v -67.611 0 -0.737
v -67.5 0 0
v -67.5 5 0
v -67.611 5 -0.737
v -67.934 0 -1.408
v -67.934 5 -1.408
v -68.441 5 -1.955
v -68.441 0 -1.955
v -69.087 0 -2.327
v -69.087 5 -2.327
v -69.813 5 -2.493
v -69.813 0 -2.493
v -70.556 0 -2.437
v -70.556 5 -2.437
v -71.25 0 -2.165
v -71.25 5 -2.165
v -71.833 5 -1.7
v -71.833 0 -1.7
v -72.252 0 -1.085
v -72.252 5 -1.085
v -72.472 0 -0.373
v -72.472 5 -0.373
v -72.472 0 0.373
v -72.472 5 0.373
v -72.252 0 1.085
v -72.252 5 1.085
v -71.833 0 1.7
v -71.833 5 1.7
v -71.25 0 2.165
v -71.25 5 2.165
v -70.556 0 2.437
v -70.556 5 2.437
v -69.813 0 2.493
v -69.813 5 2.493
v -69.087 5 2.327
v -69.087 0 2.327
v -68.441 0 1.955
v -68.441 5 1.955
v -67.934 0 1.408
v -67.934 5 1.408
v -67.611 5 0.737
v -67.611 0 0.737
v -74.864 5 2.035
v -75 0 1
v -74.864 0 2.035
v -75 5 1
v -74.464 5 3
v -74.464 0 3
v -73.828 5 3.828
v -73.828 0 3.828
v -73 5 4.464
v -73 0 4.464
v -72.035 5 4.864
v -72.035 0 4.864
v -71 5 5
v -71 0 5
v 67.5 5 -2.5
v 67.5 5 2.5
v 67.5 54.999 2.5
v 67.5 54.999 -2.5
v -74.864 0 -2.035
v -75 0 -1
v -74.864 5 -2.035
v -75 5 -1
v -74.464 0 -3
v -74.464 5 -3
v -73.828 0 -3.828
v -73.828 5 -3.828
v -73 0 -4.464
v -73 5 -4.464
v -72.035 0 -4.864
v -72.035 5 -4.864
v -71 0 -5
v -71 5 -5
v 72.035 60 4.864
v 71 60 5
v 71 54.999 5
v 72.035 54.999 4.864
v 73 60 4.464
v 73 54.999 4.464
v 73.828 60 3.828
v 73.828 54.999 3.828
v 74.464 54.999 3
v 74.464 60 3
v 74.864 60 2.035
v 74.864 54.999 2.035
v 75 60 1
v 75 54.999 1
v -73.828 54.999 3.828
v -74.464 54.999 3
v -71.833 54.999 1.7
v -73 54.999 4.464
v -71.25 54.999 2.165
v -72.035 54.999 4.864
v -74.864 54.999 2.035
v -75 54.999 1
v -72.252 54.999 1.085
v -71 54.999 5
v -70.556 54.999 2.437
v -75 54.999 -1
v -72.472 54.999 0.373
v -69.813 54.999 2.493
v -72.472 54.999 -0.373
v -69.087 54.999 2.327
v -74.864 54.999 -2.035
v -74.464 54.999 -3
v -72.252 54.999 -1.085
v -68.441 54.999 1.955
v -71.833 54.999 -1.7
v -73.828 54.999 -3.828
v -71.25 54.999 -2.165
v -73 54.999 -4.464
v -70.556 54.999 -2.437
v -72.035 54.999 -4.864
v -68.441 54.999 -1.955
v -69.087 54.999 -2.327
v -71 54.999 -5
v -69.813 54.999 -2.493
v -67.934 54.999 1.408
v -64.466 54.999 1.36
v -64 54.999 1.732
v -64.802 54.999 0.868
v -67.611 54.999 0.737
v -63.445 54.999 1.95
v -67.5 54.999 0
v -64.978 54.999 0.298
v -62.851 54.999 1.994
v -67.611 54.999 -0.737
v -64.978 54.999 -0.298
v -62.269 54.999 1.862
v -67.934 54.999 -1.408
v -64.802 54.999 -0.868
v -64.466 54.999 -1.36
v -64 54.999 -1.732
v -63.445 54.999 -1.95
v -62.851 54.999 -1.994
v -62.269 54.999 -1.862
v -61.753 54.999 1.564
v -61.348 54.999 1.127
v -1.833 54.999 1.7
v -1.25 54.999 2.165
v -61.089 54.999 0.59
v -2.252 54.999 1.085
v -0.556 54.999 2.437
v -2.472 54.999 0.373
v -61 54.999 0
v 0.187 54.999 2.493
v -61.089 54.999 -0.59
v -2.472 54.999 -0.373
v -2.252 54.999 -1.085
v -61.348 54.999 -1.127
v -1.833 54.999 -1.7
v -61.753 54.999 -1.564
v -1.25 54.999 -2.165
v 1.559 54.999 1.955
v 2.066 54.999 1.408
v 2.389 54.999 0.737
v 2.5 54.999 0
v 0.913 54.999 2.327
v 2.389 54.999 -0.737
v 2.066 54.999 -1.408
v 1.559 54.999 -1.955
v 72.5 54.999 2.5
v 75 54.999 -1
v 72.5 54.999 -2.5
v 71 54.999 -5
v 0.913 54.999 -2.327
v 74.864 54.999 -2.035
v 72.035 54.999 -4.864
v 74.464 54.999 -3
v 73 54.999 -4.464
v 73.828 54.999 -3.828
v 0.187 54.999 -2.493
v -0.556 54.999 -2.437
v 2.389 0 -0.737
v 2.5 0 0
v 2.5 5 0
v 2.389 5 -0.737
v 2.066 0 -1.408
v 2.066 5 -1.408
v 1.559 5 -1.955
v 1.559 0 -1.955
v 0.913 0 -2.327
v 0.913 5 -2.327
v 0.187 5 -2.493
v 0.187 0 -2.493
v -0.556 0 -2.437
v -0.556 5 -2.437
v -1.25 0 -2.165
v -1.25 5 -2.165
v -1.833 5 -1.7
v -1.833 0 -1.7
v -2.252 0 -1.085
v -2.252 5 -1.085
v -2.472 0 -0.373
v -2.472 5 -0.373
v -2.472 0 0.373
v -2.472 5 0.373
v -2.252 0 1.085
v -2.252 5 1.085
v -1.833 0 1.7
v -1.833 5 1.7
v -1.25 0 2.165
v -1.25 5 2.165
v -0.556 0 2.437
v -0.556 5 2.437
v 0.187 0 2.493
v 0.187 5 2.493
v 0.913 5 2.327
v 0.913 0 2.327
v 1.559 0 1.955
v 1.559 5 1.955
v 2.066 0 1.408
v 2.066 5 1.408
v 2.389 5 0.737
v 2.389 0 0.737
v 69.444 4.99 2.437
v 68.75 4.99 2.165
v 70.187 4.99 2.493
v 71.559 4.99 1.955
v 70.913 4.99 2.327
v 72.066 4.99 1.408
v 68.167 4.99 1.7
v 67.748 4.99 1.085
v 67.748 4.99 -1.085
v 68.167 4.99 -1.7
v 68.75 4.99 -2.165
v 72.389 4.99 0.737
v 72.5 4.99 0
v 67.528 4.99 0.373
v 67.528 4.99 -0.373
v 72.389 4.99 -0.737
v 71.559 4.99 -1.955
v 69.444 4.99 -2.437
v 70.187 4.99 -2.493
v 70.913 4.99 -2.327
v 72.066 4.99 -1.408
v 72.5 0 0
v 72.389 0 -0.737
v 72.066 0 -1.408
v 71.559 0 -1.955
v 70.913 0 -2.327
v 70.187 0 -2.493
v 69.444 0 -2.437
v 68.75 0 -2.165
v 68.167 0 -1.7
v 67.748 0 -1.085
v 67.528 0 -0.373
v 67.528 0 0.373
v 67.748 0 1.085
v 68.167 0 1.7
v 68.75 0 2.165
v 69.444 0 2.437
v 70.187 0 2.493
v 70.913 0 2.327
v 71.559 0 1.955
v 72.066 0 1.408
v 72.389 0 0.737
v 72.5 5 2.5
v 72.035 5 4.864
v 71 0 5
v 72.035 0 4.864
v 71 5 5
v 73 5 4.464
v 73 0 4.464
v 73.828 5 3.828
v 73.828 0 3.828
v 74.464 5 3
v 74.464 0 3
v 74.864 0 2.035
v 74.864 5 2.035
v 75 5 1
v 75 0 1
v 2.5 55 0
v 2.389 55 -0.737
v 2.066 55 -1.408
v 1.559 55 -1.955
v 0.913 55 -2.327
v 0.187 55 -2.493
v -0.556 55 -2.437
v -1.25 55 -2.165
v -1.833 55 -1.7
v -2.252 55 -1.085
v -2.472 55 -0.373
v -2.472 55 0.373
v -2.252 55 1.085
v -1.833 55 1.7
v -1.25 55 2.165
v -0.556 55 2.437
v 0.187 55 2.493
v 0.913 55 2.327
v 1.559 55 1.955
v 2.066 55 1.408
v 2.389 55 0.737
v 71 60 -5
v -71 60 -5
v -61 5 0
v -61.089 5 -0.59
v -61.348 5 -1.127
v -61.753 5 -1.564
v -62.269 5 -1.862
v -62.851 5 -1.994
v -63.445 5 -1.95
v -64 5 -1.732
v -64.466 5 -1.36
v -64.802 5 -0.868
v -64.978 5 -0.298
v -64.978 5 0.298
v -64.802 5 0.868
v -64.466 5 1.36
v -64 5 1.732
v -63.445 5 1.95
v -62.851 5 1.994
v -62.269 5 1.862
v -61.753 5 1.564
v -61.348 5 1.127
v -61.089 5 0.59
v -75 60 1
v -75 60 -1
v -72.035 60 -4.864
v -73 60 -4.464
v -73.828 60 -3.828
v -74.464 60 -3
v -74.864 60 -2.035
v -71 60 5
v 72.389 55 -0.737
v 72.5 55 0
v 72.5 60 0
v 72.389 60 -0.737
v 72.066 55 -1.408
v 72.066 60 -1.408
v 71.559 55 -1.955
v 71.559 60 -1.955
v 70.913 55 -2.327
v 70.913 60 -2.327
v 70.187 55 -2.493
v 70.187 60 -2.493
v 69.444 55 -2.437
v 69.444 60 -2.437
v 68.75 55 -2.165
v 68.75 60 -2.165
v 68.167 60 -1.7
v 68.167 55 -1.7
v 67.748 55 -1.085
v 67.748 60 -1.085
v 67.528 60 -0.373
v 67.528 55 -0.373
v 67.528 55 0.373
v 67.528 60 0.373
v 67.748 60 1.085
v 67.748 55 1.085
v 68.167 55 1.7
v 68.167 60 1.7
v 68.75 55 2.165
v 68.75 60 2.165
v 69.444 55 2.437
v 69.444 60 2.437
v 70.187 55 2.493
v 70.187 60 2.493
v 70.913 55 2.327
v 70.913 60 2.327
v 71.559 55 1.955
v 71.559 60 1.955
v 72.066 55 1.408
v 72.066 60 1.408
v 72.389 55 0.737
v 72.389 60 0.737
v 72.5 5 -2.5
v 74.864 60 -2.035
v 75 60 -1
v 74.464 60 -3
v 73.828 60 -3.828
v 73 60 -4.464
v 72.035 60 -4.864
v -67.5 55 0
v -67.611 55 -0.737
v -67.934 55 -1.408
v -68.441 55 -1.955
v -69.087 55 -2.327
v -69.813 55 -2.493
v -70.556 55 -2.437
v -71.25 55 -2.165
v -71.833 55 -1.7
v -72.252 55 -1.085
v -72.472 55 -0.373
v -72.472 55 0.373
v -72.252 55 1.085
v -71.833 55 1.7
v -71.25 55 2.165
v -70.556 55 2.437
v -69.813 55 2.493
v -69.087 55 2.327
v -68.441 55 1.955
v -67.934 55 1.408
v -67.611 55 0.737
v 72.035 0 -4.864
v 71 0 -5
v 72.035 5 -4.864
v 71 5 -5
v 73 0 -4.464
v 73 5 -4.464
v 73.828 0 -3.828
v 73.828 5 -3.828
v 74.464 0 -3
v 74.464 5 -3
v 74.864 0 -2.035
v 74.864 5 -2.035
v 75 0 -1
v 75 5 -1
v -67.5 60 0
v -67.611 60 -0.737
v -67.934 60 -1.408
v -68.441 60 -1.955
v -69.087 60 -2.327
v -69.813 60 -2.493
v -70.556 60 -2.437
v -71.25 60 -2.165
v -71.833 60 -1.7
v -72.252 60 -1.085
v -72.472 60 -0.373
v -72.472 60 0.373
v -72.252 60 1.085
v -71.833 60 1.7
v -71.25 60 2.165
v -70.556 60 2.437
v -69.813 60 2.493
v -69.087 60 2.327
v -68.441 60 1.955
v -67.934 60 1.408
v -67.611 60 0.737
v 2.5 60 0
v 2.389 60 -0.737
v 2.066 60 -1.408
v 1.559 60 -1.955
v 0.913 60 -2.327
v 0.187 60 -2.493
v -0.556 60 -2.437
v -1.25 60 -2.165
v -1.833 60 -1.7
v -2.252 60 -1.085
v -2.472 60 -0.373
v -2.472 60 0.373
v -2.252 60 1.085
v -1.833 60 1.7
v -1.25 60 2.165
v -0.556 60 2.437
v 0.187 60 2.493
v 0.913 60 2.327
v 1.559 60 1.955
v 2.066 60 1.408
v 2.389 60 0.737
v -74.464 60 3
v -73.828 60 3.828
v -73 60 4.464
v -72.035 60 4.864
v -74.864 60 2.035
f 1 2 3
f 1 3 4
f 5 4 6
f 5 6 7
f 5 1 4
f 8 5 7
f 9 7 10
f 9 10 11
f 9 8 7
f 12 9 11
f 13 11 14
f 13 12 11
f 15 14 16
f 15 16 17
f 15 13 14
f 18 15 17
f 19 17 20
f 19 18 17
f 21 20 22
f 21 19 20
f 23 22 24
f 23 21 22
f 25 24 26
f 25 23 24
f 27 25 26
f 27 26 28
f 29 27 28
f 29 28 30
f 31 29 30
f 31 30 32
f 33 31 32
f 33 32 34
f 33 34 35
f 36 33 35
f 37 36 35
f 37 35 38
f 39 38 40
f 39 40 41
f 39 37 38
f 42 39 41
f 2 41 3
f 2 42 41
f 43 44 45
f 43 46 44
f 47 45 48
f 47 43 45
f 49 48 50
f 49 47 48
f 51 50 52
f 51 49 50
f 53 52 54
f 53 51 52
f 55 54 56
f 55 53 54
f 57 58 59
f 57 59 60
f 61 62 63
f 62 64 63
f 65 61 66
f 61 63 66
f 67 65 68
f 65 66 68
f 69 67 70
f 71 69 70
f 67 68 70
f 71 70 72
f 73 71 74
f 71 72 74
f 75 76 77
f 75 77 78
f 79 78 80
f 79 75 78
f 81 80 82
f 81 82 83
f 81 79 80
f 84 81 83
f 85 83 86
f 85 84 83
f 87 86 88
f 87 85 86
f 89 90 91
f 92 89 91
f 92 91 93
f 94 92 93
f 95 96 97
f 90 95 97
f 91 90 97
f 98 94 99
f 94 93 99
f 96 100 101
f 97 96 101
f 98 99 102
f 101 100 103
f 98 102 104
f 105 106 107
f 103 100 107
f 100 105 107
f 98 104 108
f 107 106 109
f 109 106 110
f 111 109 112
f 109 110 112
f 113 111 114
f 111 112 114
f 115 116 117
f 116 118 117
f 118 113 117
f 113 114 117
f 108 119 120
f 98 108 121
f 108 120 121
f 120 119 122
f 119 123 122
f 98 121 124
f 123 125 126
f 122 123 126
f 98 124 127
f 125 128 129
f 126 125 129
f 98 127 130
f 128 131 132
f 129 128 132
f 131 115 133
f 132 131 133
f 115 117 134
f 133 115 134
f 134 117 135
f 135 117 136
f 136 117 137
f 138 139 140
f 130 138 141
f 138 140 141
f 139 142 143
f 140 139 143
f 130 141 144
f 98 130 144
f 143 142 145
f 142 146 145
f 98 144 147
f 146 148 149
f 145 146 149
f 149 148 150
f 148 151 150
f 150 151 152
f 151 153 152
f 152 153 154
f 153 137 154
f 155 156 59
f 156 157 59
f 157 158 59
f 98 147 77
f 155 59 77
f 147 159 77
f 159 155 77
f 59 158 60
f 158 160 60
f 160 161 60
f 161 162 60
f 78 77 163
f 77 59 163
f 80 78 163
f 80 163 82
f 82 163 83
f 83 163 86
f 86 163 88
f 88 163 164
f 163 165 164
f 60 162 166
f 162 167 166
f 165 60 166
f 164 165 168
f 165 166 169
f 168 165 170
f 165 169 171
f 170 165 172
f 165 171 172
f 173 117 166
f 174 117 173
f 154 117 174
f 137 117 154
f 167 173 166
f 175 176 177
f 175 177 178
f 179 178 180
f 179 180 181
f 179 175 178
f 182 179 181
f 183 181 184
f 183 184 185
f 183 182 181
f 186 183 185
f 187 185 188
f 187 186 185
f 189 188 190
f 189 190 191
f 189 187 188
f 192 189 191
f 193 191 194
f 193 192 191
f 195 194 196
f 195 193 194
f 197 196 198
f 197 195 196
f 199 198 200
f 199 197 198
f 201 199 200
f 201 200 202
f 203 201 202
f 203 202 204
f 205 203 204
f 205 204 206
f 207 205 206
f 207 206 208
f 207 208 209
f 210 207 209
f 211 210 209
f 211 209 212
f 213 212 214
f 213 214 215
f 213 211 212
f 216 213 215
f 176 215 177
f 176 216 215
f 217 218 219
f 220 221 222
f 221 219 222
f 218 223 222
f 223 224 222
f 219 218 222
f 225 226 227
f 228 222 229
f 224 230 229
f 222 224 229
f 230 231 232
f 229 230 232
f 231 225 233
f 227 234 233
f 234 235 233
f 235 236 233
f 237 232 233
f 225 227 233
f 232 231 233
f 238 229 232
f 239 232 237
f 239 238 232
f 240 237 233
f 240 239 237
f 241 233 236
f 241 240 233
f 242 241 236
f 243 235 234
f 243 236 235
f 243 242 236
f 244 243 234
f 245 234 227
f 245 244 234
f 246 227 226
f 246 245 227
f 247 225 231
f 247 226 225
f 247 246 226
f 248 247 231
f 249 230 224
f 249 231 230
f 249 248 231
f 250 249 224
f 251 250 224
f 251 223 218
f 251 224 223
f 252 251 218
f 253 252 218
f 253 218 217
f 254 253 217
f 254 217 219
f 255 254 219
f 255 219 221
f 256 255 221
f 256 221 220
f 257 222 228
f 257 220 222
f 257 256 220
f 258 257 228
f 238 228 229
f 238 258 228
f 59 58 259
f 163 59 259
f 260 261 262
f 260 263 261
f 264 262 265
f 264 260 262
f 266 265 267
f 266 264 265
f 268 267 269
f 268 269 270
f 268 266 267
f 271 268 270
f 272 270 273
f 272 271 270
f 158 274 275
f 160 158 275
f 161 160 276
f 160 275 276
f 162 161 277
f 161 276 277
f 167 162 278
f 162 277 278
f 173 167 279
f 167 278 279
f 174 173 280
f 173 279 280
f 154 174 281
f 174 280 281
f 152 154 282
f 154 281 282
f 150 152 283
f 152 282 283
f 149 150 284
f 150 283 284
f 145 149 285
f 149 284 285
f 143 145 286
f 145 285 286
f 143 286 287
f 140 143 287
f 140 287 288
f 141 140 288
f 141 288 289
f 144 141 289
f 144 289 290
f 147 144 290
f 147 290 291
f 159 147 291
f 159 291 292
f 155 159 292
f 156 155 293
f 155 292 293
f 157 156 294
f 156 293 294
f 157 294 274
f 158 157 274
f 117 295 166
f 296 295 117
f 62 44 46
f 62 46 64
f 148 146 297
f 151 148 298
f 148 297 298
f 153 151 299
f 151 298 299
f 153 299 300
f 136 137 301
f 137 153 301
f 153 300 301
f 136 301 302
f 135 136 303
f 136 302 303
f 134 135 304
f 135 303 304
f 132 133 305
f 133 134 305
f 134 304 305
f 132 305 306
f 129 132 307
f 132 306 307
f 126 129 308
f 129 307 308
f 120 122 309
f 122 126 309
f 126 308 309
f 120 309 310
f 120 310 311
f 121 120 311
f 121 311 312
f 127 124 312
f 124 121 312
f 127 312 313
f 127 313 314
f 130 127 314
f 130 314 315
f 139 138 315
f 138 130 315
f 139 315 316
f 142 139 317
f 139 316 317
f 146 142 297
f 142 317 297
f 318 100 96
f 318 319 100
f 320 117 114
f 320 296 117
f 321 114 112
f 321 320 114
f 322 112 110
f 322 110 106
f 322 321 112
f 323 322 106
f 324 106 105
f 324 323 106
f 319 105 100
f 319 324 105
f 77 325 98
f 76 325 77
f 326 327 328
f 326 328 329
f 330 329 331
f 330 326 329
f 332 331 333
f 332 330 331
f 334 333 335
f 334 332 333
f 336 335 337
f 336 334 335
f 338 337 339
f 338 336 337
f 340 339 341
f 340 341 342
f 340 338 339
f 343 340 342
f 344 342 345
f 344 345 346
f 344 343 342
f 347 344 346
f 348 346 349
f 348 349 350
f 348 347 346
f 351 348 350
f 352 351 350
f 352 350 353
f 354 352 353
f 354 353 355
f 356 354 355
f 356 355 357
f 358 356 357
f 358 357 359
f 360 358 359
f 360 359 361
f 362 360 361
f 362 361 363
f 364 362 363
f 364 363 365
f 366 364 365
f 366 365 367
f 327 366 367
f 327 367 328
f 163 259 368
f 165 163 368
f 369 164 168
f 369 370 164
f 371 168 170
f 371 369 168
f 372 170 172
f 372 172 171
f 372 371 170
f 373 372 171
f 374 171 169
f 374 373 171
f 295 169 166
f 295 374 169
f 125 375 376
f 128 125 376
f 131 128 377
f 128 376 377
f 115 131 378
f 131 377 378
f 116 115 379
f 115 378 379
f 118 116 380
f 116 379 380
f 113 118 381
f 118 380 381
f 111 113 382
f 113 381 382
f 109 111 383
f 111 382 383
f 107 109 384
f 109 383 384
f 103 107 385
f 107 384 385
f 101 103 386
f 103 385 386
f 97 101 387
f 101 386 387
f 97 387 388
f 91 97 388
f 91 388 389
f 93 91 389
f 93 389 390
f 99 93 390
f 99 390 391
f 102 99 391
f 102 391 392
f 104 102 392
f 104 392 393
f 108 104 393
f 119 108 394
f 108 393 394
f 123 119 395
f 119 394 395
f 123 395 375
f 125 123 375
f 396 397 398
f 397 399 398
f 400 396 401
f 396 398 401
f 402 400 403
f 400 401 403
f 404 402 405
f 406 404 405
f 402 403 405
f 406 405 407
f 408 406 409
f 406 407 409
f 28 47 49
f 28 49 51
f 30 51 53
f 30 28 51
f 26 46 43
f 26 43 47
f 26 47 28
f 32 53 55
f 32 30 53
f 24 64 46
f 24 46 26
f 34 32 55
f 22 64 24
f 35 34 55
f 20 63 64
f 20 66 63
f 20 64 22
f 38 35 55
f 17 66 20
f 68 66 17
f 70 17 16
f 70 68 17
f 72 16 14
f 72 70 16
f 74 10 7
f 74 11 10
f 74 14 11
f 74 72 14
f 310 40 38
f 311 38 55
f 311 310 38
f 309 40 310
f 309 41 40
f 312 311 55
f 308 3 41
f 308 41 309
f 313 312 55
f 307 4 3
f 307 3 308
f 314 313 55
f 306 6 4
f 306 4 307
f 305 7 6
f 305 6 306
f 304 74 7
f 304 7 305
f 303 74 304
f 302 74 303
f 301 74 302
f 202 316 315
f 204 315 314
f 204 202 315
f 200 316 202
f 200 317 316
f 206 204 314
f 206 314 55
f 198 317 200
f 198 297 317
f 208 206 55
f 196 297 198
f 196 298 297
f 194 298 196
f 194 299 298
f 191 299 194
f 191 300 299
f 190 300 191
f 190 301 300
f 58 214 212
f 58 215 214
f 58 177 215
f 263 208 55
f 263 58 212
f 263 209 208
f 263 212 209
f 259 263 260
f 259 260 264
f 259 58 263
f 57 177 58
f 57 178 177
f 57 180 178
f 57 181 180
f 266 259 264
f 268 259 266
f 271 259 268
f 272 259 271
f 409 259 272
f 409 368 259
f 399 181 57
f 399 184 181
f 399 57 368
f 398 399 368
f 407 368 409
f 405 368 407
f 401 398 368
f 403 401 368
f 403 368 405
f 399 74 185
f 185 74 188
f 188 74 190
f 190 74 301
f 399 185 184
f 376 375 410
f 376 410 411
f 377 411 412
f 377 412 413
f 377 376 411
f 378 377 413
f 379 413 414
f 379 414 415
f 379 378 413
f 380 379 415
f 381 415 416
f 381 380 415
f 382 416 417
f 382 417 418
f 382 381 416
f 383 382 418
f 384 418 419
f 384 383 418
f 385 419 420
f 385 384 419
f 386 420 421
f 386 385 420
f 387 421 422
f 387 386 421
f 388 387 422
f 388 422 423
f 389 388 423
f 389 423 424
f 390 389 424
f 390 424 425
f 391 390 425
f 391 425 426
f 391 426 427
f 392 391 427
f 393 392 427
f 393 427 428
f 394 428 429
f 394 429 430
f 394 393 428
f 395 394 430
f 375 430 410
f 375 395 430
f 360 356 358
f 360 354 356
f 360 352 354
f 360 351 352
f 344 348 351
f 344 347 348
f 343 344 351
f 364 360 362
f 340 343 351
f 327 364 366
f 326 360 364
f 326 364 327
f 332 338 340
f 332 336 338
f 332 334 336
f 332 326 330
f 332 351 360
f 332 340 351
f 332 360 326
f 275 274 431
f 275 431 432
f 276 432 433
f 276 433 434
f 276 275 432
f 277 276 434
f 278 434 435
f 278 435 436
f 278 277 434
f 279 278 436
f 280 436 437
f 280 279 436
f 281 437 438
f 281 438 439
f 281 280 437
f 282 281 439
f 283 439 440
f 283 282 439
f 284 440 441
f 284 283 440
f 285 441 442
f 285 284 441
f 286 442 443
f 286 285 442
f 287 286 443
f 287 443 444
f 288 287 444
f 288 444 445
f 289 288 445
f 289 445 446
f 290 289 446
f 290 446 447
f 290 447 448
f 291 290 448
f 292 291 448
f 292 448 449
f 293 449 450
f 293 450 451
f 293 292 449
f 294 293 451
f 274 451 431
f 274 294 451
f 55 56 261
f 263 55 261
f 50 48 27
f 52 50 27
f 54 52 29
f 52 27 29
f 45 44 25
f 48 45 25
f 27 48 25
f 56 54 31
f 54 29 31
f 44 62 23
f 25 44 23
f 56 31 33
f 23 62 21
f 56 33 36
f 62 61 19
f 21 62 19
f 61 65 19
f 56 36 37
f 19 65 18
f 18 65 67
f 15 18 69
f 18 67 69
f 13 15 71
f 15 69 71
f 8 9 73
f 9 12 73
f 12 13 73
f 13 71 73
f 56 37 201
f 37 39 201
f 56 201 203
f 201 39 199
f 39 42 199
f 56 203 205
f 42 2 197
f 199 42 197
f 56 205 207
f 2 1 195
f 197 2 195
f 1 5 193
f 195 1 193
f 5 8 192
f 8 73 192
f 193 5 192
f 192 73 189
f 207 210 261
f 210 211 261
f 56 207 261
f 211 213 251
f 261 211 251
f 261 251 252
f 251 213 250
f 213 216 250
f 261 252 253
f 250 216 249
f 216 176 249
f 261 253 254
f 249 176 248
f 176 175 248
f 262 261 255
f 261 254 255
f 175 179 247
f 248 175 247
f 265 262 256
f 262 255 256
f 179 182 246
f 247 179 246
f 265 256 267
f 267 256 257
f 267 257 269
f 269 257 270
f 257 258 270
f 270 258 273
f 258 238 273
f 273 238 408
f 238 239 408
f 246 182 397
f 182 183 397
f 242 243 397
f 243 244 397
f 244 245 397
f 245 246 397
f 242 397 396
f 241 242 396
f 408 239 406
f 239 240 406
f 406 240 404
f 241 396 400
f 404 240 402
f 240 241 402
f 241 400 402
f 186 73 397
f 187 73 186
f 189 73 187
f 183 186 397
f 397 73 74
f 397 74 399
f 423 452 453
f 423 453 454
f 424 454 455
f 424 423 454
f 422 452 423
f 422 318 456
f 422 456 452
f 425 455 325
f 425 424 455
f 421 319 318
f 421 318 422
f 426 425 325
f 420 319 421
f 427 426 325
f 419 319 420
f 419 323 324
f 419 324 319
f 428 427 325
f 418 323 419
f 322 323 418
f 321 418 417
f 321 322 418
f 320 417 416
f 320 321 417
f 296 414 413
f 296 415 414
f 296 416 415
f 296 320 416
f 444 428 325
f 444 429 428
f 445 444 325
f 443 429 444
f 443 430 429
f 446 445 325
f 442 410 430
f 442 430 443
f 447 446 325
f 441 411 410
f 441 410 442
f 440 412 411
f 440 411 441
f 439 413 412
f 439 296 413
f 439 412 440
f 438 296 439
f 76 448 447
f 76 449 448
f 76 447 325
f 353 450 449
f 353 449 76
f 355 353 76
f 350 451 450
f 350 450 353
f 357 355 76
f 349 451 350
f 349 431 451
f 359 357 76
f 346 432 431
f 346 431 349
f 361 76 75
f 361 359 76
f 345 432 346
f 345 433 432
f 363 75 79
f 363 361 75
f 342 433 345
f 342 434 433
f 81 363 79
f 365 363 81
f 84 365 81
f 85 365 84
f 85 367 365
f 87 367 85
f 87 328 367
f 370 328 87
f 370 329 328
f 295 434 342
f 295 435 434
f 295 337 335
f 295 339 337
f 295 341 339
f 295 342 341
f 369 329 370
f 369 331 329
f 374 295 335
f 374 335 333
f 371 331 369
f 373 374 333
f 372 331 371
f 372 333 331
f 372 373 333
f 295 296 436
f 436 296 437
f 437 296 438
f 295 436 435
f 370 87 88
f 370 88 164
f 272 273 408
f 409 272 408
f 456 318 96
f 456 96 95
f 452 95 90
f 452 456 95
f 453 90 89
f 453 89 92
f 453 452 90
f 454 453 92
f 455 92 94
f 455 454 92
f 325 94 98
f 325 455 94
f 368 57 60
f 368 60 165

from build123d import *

# Parameters (mm, degrees)
CROQUIS1_W                    = 150
CROQUIS1_H                    = 10
CROQUIS1_R                    = 2.5
SALIENTE_EXTRUIR1_DEPTH       = 5
REDONDEO1_R                   = 4
CROQUIS2_R                    = 2
CROQUIS2_W                    = 5
CROQUIS2_H                    = 5
SALIENTE_EXTRUIR2_DEPTH       = 50
SALIENTE_EXTRUIR2_DEPTH_BACK  = 0.01
CROQUIS3_R                    = 2.5
SALIENTE_EXTRUIR10_DEPTH      = 5
SALIENTE_EXTRUIR10_DEPTH_BACK = 0.001


with BuildPart() as part:
    # Croquis1 → Saliente-Extruir1 (new body)
    with BuildSketch(Plane(origin=(0, 0, 0), x_dir=(1, 0, 0), z_dir=(0, 1, 0))):
        Rectangle(CROQUIS1_W, CROQUIS1_H)
        with Locations((-70, 0)):
            Circle(CROQUIS1_R, mode=Mode.SUBTRACT)
        with Locations((70, 0)):
            Circle(CROQUIS1_R, mode=Mode.SUBTRACT)
        Circle(CROQUIS1_R, mode=Mode.SUBTRACT)
    extrude(amount=SALIENTE_EXTRUIR1_DEPTH)

    # Redondeo1
    redondeo1_edges = [part.edges().sort_by_distance(p)[0] for p in [
        (75, 2.5, 5),
        (-75, 2.5, 5),
        (-75, 2.5, -5),
        (75, 2.5, -5),
    ]]
    fillet(redondeo1_edges, radius=REDONDEO1_R)

    # Croquis2 → Saliente-Extruir2 (add, two sides)
    with BuildSketch(Plane(origin=(0, 5, 0), x_dir=(1, 0, 0), z_dir=(0, 1, 0))) as saliente_extruir2_sk:
        with Locations((-63, 0)):
            Circle(CROQUIS2_R)
        with Locations((70, 0)):
            Rectangle(CROQUIS2_W, CROQUIS2_H)
    extrude(amount=SALIENTE_EXTRUIR2_DEPTH)
    extrude(saliente_extruir2_sk.sketch, amount=-SALIENTE_EXTRUIR2_DEPTH_BACK)

    # Croquis3 → Saliente-Extruir10 (add, two sides)
    with BuildSketch(Plane(origin=(0, 55, 0), x_dir=(1, 0, 0), z_dir=(0, 1, 0))) as saliente_extruir10_sk:
        with BuildLine():
            Line((-75, 1), (-75, -1))
            ThreePointArc((-75, -1), (-73.828427125, -3.828427125), (-71, -5))
            Line((-71, -5), (71, -5))
            ThreePointArc((71, -5), (73.828427125, -3.828427125), (75, -1))
            Line((75, -1), (75, 1))
            ThreePointArc((75, 1), (73.828427125, 3.828427125), (71, 5))
            Line((71, 5), (-71, 5))
            ThreePointArc((-71, 5), (-73.828427125, 3.828427125), (-75, 1))
        make_face()
        with Locations((70, 0)):
            Circle(CROQUIS3_R, mode=Mode.SUBTRACT)
        Circle(CROQUIS3_R, mode=Mode.SUBTRACT)
        with Locations((-70, 0)):
            Circle(CROQUIS3_R, mode=Mode.SUBTRACT)
    extrude(amount=SALIENTE_EXTRUIR10_DEPTH)
    extrude(saliente_extruir10_sk.sketch, amount=-SALIENTE_EXTRUIR10_DEPTH_BACK)


solid = part.part
